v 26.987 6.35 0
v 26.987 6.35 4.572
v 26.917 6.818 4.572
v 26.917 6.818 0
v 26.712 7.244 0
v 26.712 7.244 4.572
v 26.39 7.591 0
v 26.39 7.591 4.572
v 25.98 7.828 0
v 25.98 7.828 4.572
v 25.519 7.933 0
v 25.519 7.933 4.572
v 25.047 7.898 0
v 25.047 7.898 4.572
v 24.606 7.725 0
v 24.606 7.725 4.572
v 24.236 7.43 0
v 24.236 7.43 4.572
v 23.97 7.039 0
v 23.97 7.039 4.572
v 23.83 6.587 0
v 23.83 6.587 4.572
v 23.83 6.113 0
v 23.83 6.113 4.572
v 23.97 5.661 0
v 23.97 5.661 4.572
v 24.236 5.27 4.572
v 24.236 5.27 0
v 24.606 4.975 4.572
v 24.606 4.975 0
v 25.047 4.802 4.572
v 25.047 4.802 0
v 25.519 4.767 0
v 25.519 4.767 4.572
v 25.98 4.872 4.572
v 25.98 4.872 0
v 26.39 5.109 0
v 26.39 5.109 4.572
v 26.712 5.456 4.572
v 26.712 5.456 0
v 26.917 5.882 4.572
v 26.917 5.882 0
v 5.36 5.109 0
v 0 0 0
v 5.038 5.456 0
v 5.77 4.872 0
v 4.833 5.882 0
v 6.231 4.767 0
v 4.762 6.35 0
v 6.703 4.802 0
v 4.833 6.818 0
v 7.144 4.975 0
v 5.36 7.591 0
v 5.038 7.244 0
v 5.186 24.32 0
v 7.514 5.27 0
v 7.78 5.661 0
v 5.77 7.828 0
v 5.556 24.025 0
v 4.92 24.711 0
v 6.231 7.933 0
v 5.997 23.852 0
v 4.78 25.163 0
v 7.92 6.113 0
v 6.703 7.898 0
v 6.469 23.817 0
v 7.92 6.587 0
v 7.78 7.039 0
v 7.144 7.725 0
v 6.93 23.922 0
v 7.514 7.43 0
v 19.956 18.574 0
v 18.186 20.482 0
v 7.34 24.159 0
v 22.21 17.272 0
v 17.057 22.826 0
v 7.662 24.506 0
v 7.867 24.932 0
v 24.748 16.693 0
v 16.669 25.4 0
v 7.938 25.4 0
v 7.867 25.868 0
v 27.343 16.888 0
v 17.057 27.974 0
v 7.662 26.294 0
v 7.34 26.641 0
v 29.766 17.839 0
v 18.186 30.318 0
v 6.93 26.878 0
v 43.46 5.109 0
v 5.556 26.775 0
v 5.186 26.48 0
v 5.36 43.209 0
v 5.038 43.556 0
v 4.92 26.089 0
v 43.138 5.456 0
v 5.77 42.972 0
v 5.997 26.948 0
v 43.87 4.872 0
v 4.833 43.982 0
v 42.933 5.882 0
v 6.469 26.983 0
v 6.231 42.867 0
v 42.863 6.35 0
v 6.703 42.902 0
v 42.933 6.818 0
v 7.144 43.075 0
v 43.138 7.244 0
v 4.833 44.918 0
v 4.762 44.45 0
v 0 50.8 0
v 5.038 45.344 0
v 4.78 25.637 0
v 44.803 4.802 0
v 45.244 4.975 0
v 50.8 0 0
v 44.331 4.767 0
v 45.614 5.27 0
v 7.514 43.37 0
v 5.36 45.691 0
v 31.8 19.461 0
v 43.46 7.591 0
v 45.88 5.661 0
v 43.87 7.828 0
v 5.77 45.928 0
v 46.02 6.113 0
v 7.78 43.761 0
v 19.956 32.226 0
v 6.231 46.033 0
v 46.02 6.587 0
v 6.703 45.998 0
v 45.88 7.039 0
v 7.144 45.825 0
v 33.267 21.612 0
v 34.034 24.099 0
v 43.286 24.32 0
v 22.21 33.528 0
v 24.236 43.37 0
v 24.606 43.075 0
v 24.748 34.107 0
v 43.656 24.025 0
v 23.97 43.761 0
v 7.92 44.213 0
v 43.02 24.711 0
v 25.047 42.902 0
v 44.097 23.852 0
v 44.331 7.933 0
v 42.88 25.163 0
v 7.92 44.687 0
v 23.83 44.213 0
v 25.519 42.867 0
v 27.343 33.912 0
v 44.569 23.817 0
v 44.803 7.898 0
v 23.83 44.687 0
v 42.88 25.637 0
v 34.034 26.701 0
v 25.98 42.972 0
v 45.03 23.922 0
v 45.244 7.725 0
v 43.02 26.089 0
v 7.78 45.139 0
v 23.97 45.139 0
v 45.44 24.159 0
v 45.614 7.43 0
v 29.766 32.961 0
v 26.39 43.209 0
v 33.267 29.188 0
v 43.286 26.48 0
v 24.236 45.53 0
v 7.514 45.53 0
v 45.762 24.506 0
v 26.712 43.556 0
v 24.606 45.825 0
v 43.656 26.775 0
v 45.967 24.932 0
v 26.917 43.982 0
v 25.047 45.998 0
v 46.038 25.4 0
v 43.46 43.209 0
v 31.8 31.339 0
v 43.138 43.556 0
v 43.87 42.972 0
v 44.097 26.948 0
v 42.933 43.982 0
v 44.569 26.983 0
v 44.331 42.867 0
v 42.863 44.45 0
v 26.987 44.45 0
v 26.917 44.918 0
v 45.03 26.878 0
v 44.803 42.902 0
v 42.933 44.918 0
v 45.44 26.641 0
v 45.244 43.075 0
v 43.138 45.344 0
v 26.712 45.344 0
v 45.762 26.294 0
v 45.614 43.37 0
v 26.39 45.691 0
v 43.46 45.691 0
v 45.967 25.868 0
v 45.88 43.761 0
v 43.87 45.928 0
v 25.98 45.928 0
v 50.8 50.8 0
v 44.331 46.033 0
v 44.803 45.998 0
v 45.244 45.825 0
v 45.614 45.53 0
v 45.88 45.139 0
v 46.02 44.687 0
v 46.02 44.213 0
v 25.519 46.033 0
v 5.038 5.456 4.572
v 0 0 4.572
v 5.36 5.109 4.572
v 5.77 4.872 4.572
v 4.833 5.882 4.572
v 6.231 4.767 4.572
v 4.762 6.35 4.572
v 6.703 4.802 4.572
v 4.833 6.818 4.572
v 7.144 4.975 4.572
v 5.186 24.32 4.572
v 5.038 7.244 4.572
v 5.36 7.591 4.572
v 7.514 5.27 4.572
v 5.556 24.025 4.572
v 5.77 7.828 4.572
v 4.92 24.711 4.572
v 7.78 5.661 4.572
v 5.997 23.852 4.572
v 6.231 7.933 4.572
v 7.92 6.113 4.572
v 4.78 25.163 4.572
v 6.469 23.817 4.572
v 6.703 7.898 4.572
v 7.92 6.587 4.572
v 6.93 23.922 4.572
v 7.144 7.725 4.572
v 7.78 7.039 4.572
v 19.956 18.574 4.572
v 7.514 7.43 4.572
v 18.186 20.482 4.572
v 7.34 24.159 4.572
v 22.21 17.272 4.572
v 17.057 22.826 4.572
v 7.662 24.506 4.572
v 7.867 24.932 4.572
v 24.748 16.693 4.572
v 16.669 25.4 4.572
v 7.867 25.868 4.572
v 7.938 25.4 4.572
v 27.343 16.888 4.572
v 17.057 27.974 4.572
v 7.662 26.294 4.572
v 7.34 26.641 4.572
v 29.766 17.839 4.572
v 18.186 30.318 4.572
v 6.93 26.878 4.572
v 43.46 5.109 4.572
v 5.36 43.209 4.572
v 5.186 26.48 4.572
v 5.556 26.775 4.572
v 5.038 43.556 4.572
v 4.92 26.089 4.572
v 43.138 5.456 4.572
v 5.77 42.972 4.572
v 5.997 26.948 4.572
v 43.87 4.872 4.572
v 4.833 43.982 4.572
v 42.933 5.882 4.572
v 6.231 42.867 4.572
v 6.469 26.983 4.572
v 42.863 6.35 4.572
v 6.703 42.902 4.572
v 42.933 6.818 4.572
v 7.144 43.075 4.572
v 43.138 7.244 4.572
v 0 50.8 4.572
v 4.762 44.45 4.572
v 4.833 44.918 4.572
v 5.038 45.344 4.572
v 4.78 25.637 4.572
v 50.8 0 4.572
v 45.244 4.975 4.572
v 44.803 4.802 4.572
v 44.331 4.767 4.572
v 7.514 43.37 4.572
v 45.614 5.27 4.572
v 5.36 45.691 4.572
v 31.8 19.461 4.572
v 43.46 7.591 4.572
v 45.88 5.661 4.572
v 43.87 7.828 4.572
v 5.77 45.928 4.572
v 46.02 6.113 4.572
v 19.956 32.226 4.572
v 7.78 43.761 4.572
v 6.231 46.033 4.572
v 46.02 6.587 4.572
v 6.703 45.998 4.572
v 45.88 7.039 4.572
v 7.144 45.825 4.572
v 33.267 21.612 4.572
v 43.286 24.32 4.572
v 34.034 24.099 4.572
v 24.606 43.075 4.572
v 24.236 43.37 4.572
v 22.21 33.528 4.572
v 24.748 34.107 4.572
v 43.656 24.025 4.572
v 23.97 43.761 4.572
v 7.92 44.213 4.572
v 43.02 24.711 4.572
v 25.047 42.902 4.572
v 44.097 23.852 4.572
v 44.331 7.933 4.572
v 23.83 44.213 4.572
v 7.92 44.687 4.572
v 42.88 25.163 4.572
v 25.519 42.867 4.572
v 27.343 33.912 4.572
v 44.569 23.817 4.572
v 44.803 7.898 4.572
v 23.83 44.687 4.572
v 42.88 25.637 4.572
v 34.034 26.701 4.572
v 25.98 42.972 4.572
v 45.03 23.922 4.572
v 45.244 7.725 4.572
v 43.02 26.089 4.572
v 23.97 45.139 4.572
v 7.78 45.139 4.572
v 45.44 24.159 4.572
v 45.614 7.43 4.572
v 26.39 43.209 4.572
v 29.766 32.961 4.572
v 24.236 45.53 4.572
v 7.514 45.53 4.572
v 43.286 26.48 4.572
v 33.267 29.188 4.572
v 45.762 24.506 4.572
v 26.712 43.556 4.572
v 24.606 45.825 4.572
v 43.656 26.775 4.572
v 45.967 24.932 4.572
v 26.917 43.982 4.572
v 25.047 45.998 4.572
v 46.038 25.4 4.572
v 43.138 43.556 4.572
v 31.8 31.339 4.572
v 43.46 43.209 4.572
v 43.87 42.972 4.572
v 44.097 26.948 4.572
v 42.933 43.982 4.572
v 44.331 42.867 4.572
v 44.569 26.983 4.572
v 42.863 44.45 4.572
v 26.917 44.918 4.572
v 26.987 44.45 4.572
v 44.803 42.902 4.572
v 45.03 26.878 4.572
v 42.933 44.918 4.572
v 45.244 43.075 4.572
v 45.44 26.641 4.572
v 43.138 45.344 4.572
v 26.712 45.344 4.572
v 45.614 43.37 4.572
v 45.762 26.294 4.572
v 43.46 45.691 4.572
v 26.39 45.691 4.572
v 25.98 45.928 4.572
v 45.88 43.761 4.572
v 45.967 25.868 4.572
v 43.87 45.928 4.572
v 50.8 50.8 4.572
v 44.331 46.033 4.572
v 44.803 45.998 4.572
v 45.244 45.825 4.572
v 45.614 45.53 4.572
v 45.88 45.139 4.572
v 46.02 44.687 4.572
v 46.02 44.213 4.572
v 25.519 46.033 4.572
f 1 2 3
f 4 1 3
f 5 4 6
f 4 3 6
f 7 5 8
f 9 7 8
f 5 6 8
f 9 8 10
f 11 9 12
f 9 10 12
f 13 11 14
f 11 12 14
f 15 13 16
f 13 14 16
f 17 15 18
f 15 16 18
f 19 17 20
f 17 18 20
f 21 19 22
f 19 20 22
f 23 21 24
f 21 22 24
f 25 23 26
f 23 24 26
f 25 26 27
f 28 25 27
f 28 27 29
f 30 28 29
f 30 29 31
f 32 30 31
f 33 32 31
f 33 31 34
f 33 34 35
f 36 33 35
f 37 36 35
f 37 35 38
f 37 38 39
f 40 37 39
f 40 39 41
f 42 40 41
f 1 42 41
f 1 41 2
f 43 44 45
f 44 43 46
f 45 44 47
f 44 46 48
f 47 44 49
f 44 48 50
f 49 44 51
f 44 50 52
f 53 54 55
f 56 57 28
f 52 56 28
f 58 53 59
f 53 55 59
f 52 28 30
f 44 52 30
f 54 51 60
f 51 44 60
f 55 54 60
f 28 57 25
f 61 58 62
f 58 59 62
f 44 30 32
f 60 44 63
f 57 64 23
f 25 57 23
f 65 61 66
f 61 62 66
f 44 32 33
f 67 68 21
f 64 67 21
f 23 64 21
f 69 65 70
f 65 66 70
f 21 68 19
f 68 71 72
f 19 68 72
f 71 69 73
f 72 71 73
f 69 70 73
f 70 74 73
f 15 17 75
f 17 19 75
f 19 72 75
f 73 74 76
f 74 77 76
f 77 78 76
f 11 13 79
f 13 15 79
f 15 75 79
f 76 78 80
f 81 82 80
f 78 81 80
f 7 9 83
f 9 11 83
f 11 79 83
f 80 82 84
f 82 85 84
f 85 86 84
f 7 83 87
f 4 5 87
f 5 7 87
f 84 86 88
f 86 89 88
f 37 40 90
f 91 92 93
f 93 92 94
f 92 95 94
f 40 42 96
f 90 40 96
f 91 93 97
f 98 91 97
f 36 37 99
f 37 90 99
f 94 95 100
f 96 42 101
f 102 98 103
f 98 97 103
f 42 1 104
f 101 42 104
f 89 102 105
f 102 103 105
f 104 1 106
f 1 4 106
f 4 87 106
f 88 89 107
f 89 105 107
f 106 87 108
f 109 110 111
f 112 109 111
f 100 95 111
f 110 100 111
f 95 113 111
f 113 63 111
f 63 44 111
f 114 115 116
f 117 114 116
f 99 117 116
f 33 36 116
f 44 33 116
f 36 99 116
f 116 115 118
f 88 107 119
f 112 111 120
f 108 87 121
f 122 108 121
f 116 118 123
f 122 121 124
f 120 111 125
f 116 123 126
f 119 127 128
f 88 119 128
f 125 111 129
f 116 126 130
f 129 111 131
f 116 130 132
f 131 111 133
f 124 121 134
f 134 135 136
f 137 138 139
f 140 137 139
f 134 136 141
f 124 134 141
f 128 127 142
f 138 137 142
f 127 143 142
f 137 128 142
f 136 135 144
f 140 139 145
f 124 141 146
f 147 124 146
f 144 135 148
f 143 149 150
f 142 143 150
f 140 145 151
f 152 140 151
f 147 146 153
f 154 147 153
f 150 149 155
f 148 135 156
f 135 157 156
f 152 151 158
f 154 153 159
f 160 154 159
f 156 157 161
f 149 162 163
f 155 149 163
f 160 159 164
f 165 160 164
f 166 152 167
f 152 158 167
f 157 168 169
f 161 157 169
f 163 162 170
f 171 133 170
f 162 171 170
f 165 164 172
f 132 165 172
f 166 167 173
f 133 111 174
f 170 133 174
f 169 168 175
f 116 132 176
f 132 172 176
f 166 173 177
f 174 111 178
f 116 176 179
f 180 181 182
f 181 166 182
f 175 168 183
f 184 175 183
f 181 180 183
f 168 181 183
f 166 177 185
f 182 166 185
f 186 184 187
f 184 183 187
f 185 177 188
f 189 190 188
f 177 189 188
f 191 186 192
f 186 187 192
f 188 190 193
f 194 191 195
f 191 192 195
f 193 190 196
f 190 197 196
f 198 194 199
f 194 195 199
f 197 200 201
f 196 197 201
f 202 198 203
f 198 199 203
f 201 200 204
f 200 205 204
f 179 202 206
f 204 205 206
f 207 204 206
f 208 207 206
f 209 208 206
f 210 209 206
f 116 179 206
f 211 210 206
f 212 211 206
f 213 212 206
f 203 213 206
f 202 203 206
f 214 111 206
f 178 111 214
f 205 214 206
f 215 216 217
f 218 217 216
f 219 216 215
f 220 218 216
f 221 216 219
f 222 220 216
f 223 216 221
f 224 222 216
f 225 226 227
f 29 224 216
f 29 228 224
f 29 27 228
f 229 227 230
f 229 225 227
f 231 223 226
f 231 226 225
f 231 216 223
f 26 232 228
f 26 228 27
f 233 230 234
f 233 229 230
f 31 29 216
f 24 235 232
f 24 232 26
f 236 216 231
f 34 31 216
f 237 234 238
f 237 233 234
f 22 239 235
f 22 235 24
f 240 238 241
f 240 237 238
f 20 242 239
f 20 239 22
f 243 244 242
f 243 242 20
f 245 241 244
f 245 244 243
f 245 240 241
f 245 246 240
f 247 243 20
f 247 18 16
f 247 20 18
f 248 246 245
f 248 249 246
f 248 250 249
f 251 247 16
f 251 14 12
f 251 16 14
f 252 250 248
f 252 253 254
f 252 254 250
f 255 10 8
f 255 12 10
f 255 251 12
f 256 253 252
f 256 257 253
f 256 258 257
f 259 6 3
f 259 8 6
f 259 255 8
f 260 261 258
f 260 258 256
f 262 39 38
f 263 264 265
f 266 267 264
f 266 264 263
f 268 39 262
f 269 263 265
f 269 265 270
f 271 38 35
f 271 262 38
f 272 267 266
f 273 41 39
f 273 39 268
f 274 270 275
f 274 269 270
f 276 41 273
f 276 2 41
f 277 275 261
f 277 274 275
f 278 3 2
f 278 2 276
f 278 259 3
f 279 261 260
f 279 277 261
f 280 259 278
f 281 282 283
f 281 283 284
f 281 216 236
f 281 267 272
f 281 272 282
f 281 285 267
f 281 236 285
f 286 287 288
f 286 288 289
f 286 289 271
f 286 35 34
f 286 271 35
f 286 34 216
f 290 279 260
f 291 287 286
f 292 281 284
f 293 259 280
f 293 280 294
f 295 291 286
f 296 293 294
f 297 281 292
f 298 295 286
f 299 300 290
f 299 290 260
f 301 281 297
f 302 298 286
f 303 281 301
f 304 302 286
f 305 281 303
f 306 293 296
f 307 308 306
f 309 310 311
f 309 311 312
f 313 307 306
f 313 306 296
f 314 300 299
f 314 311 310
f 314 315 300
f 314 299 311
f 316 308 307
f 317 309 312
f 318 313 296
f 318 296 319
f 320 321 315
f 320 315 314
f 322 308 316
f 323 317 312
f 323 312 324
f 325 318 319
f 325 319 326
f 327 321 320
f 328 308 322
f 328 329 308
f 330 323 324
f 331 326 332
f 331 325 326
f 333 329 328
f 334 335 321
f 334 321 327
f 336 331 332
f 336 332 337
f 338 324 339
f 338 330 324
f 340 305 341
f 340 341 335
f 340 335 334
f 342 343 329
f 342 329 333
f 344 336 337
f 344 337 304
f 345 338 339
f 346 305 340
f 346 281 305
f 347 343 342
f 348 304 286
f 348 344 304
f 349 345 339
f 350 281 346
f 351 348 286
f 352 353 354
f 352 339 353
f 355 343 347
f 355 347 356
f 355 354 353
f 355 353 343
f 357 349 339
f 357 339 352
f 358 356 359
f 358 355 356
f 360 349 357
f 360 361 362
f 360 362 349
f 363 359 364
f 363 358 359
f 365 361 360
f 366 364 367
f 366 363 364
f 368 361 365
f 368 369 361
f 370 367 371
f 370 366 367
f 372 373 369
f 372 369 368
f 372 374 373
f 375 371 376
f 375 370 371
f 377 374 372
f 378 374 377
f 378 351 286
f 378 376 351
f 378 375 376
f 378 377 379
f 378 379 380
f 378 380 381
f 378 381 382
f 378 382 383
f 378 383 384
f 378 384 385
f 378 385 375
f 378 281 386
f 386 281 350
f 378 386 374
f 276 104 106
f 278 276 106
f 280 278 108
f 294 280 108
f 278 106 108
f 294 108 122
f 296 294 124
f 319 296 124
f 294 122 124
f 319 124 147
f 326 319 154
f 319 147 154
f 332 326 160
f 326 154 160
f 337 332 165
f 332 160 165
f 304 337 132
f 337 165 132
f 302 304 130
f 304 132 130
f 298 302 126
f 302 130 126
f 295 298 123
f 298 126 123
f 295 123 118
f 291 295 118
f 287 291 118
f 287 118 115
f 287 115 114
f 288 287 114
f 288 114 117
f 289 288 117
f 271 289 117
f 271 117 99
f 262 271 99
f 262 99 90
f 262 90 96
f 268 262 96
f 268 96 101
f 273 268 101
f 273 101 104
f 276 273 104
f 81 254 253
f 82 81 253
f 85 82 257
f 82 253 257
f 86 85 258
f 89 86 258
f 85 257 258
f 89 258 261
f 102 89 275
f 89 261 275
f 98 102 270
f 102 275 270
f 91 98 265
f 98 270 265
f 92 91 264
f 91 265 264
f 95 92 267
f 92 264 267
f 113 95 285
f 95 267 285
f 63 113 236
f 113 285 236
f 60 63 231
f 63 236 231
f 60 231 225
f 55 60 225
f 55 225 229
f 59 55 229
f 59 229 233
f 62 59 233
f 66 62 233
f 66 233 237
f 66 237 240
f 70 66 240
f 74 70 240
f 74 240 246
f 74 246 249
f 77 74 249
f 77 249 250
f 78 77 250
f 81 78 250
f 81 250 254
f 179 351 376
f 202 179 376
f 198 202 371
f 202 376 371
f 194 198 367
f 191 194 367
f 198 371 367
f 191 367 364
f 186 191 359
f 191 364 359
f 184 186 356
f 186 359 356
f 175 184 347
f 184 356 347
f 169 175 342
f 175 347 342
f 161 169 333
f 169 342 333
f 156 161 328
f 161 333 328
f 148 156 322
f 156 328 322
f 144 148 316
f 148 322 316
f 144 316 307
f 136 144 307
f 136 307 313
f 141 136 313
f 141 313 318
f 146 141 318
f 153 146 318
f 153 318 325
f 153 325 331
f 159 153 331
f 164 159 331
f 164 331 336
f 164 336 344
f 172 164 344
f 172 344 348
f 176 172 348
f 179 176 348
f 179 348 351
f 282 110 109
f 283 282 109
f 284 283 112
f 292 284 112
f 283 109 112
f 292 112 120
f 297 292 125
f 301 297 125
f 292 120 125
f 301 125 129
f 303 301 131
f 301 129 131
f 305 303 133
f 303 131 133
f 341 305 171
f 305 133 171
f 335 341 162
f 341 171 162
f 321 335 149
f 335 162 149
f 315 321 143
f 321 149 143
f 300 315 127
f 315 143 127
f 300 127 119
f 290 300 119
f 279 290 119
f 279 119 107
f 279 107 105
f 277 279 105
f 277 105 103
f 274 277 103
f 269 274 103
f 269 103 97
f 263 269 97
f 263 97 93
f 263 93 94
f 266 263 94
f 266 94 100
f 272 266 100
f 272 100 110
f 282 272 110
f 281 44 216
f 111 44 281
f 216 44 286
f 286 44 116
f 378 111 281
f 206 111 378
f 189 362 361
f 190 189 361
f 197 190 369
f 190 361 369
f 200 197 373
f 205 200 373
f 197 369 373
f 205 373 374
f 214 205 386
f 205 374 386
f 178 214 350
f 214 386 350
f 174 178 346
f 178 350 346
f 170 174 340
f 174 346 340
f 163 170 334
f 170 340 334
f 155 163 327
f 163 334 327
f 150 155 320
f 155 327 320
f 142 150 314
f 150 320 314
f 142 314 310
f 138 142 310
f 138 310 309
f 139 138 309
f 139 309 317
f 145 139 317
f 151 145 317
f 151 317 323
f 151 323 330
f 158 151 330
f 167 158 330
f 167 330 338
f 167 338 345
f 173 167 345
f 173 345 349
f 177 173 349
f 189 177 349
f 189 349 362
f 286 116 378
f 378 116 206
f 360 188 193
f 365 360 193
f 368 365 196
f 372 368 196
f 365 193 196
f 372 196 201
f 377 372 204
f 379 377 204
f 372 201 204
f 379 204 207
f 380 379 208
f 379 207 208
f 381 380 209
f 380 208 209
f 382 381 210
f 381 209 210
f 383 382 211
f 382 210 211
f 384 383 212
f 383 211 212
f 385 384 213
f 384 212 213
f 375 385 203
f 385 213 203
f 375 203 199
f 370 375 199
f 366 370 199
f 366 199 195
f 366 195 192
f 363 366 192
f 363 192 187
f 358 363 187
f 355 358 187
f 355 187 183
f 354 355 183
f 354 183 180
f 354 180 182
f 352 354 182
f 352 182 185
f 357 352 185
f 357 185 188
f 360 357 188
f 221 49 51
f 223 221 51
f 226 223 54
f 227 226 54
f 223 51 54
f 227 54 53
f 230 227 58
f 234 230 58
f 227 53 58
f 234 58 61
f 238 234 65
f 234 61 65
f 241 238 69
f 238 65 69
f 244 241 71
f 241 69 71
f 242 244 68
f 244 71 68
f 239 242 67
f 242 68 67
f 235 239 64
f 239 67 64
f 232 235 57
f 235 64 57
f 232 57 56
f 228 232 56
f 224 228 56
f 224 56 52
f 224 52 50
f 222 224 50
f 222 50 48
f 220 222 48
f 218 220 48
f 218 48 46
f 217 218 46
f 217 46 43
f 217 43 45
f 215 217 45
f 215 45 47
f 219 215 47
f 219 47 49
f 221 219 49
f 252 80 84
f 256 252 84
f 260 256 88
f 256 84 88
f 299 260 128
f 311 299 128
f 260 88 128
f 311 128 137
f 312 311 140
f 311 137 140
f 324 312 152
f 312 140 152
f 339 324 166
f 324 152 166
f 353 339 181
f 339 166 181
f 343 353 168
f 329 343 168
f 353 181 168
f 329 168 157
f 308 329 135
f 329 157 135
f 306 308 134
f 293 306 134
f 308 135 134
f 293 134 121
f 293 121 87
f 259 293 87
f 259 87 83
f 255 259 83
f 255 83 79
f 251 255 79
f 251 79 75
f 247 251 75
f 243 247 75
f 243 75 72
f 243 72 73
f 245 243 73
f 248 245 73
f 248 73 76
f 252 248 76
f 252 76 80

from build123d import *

# Parameters (mm, degrees)
SKETCH1_W           = 50.8
SKETCH1_H           = 50.8
BOSS_EXTRUDE1_DEPTH = 4.572
SKETCH2_R           = 8.73125
CUT_EXTRUDE7_DEPTH  = 5.572
SKETCH5_R           = 1.5875
CUT_EXTRUDE8_DEPTH  = 5.572
SKETCH7_R           = 1.5875
CUT_EXTRUDE9_DEPTH  = 5.572


with BuildPart() as part:
    # Sketch1 → Boss-Extrude1 (new body)
    with BuildSketch(Plane.XY):
        with Locations((25.4, 25.4)):
            Rectangle(SKETCH1_W, SKETCH1_H)
    extrude(amount=BOSS_EXTRUDE1_DEPTH)

    # Sketch2 → Cut-Extrude7 (cut, through all)
    with BuildSketch(Plane(origin=(0, 0, 0), x_dir=(-1, 0, 0), z_dir=(0, 0, -1))):
        with Locations((-25.4, 25.4)):
            Circle(SKETCH2_R)
    extrude(amount=-CUT_EXTRUDE7_DEPTH, mode=Mode.SUBTRACT)

    # Sketch5 → Cut-Extrude8 (cut, through all)
    with BuildSketch(Plane.XY.offset(4.572)):
        with Locations((25.4, 6.35)):
            Circle(SKETCH5_R)
        with Locations((6.35, 25.4)):
            Circle(SKETCH5_R)
        with Locations((25.4, 44.45)):
            Circle(SKETCH5_R)
        with Locations((44.45, 25.4)):
            Circle(SKETCH5_R)
    extrude(amount=-CUT_EXTRUDE8_DEPTH, mode=Mode.SUBTRACT)

    # Sketch7 → Cut-Extrude9 (cut, through all)
    with BuildSketch(Plane(origin=(0, 0, 0), x_dir=(-1, 0, 0), z_dir=(0, 0, -1))):
        with Locations((-6.35, 6.35)):
            Circle(SKETCH7_R)
        with Locations((-44.45, 6.35)):
            Circle(SKETCH7_R)
        with Locations((-44.45, 44.45)):
            Circle(SKETCH7_R)
        with Locations((-6.35, 44.45)):
            Circle(SKETCH7_R)
    extrude(amount=-CUT_EXTRUDE9_DEPTH, mode=Mode.SUBTRACT)


solid = part.part
